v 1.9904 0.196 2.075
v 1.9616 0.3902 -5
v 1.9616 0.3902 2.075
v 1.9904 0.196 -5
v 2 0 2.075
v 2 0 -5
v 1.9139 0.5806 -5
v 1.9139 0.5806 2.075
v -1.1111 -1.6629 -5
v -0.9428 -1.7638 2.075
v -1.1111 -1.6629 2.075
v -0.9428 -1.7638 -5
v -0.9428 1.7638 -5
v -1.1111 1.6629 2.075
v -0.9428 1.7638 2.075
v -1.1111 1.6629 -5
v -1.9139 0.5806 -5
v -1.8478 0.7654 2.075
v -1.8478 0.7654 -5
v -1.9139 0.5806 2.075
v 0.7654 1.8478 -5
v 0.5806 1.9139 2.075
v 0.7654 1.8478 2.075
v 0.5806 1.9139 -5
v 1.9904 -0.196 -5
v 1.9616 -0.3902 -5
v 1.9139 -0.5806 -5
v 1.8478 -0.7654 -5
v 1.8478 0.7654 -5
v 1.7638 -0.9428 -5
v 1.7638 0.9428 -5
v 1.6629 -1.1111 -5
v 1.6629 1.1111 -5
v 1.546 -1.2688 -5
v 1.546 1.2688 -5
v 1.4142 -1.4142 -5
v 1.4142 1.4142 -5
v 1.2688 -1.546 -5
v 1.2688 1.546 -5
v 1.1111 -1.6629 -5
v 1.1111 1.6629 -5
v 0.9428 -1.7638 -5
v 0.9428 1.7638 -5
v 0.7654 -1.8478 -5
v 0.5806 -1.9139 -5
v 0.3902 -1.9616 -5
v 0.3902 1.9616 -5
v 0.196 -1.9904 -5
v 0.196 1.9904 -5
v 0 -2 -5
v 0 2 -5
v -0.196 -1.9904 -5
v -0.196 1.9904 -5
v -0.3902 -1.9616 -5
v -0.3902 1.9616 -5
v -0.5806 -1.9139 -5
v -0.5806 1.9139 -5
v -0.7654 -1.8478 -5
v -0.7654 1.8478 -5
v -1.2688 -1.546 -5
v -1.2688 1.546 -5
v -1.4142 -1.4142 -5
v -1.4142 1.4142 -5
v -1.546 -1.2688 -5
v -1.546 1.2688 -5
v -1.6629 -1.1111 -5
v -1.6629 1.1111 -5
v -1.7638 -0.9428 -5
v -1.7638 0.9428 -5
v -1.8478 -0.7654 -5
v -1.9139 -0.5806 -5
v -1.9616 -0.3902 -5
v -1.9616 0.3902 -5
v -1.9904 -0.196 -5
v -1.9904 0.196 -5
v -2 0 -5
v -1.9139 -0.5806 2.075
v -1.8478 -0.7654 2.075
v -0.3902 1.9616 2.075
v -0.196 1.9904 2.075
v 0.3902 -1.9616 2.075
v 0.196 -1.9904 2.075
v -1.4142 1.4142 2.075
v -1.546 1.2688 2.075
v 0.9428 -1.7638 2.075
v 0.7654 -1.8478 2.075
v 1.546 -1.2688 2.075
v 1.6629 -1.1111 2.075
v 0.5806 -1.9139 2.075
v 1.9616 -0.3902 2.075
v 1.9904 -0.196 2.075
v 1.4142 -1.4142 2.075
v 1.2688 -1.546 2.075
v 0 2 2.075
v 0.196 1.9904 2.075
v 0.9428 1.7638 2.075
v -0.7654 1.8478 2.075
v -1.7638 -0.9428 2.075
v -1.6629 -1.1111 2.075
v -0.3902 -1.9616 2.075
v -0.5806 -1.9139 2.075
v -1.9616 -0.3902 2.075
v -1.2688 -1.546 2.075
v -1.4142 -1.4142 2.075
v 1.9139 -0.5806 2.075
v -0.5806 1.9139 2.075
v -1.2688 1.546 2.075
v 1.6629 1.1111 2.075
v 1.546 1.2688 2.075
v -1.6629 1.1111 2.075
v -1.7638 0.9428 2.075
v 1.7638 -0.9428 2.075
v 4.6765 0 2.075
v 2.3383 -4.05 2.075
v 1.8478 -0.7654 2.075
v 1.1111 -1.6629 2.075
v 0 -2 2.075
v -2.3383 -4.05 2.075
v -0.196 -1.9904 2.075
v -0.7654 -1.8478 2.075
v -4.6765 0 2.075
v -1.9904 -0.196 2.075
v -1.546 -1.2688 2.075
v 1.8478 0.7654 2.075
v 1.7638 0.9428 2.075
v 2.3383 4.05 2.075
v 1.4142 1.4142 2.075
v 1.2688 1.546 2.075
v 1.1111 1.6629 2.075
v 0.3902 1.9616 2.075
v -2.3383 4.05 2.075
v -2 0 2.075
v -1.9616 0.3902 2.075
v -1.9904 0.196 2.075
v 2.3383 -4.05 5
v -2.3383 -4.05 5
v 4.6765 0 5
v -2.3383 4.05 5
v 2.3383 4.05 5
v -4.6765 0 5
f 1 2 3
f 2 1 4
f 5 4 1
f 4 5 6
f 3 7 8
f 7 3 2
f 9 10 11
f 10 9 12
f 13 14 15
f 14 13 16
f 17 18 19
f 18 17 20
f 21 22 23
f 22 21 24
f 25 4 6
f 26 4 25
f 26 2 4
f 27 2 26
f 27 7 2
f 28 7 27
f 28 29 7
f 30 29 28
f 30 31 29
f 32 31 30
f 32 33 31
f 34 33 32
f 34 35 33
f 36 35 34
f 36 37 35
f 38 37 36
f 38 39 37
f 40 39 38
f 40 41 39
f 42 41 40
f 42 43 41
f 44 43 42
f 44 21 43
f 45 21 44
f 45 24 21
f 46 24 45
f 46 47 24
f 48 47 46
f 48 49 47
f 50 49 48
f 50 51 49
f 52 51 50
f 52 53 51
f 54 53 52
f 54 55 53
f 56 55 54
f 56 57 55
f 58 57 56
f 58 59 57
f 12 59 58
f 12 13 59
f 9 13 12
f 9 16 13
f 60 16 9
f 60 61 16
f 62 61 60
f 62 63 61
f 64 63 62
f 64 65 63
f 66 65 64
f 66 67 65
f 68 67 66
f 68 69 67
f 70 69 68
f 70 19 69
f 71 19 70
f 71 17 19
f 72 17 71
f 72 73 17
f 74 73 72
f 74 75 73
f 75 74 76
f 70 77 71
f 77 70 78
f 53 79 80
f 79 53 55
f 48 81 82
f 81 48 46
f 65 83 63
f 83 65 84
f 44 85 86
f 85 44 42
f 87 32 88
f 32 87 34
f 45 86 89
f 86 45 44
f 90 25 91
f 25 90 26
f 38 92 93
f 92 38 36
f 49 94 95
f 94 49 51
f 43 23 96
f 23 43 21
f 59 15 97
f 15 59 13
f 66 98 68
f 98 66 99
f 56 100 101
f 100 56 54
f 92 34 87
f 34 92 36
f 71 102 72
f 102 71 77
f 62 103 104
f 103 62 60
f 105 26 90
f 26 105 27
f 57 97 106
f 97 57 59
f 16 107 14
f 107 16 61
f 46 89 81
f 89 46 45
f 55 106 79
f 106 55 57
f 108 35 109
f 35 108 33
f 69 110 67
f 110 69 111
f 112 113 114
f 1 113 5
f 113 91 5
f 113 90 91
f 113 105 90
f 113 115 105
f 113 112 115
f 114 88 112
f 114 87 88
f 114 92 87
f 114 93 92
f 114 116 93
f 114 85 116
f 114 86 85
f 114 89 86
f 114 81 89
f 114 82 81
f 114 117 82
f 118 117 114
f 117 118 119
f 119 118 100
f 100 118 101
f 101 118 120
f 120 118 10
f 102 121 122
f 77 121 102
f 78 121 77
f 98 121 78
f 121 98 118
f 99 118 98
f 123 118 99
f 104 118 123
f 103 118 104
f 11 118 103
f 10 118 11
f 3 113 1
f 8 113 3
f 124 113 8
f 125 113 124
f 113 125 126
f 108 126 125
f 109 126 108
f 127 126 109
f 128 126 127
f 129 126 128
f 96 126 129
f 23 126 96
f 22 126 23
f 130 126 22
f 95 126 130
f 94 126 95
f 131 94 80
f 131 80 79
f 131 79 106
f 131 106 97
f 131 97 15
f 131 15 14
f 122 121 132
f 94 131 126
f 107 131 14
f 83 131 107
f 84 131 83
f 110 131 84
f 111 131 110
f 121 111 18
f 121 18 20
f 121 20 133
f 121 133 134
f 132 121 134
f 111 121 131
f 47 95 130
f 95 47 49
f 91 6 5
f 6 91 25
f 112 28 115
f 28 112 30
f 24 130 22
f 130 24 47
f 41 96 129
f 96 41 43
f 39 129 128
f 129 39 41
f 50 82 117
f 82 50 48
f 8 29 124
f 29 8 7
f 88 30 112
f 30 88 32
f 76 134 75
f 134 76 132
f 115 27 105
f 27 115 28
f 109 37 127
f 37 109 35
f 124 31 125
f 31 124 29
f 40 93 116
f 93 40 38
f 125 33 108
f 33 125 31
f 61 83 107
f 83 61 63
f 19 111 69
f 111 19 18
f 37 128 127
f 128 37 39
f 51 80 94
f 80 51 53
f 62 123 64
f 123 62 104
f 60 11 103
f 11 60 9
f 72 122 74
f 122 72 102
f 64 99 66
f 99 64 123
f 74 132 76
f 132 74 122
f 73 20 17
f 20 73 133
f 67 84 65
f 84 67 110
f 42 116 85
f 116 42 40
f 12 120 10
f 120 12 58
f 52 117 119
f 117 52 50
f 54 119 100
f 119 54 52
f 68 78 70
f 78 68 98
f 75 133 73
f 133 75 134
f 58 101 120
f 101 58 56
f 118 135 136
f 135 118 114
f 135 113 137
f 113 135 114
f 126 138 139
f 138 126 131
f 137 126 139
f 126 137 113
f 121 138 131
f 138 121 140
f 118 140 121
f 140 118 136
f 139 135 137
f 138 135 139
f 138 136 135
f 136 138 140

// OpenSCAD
$fn=64;

module hex_prism(flat_d, h){
    r = flat_d / sqrt(3);
    cylinder(h=h, r=r, $fn=6);
}

module screw_shank(d, l){
    cylinder(h=l, d=d, $fn=64);
}

module hex_head(head_d, head_h){
    hex_prism(head_d, head_h);
}

module hex_head_screw(shank_d=4.0, head_d=8.1, head_h=2.925, total_l=10.0){
    shank_l = max(0, total_l - head_h);
    union(){
        translate([0,0,-total_l/2])
            screw_shank(shank_d, shank_l);
        translate([0,0,-total_l/2 + shank_l])
            hex_head(head_d, head_h);
    }
}

hex_head_screw(4.0, 8.1, 2.925, 10.0);
